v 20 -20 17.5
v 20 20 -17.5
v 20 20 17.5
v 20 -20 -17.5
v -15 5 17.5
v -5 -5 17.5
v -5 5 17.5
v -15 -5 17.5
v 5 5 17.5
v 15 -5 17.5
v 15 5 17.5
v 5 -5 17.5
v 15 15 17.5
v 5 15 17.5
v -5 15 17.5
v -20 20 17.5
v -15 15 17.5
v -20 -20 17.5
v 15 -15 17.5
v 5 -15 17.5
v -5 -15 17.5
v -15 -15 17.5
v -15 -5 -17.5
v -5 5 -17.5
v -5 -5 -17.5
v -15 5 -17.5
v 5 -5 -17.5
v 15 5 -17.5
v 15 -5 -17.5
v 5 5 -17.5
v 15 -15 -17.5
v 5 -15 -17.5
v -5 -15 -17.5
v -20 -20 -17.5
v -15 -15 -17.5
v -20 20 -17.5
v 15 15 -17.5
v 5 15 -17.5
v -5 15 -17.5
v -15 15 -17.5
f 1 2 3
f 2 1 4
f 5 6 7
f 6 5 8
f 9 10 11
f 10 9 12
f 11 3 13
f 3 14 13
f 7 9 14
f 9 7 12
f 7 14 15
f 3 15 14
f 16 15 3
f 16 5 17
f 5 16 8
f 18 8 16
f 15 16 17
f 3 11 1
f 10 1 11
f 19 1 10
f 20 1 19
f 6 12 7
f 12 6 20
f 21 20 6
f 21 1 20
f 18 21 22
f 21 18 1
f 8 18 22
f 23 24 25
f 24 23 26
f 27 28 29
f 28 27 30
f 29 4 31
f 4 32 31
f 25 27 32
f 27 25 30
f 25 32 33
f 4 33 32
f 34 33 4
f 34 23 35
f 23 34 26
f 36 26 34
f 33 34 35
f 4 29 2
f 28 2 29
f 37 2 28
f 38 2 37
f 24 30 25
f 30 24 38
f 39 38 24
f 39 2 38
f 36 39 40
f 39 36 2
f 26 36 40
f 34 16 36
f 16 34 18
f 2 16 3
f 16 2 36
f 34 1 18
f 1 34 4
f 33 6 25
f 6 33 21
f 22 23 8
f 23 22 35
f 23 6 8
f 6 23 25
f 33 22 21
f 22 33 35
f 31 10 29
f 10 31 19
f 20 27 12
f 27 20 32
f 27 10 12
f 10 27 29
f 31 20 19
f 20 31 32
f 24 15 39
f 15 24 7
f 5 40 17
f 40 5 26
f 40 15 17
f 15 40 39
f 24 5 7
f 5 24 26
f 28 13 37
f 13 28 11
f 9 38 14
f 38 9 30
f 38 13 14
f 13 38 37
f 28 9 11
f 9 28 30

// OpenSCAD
module extrusion_bracket() {
    difference() {
        cube([40, 40, 35], center = true);
        translate([-15, -15, -35])
            cube([10, 10, 70], center = false);
        translate([5, -15, -35])
            cube([10, 10, 70], center = false);
        translate([-15, 5, -35])
            cube([10, 10, 70], center = false);
        translate([5, 5, -35])
            cube([10, 10, 70], center = false);
    }
}

extrusion_bracket();
